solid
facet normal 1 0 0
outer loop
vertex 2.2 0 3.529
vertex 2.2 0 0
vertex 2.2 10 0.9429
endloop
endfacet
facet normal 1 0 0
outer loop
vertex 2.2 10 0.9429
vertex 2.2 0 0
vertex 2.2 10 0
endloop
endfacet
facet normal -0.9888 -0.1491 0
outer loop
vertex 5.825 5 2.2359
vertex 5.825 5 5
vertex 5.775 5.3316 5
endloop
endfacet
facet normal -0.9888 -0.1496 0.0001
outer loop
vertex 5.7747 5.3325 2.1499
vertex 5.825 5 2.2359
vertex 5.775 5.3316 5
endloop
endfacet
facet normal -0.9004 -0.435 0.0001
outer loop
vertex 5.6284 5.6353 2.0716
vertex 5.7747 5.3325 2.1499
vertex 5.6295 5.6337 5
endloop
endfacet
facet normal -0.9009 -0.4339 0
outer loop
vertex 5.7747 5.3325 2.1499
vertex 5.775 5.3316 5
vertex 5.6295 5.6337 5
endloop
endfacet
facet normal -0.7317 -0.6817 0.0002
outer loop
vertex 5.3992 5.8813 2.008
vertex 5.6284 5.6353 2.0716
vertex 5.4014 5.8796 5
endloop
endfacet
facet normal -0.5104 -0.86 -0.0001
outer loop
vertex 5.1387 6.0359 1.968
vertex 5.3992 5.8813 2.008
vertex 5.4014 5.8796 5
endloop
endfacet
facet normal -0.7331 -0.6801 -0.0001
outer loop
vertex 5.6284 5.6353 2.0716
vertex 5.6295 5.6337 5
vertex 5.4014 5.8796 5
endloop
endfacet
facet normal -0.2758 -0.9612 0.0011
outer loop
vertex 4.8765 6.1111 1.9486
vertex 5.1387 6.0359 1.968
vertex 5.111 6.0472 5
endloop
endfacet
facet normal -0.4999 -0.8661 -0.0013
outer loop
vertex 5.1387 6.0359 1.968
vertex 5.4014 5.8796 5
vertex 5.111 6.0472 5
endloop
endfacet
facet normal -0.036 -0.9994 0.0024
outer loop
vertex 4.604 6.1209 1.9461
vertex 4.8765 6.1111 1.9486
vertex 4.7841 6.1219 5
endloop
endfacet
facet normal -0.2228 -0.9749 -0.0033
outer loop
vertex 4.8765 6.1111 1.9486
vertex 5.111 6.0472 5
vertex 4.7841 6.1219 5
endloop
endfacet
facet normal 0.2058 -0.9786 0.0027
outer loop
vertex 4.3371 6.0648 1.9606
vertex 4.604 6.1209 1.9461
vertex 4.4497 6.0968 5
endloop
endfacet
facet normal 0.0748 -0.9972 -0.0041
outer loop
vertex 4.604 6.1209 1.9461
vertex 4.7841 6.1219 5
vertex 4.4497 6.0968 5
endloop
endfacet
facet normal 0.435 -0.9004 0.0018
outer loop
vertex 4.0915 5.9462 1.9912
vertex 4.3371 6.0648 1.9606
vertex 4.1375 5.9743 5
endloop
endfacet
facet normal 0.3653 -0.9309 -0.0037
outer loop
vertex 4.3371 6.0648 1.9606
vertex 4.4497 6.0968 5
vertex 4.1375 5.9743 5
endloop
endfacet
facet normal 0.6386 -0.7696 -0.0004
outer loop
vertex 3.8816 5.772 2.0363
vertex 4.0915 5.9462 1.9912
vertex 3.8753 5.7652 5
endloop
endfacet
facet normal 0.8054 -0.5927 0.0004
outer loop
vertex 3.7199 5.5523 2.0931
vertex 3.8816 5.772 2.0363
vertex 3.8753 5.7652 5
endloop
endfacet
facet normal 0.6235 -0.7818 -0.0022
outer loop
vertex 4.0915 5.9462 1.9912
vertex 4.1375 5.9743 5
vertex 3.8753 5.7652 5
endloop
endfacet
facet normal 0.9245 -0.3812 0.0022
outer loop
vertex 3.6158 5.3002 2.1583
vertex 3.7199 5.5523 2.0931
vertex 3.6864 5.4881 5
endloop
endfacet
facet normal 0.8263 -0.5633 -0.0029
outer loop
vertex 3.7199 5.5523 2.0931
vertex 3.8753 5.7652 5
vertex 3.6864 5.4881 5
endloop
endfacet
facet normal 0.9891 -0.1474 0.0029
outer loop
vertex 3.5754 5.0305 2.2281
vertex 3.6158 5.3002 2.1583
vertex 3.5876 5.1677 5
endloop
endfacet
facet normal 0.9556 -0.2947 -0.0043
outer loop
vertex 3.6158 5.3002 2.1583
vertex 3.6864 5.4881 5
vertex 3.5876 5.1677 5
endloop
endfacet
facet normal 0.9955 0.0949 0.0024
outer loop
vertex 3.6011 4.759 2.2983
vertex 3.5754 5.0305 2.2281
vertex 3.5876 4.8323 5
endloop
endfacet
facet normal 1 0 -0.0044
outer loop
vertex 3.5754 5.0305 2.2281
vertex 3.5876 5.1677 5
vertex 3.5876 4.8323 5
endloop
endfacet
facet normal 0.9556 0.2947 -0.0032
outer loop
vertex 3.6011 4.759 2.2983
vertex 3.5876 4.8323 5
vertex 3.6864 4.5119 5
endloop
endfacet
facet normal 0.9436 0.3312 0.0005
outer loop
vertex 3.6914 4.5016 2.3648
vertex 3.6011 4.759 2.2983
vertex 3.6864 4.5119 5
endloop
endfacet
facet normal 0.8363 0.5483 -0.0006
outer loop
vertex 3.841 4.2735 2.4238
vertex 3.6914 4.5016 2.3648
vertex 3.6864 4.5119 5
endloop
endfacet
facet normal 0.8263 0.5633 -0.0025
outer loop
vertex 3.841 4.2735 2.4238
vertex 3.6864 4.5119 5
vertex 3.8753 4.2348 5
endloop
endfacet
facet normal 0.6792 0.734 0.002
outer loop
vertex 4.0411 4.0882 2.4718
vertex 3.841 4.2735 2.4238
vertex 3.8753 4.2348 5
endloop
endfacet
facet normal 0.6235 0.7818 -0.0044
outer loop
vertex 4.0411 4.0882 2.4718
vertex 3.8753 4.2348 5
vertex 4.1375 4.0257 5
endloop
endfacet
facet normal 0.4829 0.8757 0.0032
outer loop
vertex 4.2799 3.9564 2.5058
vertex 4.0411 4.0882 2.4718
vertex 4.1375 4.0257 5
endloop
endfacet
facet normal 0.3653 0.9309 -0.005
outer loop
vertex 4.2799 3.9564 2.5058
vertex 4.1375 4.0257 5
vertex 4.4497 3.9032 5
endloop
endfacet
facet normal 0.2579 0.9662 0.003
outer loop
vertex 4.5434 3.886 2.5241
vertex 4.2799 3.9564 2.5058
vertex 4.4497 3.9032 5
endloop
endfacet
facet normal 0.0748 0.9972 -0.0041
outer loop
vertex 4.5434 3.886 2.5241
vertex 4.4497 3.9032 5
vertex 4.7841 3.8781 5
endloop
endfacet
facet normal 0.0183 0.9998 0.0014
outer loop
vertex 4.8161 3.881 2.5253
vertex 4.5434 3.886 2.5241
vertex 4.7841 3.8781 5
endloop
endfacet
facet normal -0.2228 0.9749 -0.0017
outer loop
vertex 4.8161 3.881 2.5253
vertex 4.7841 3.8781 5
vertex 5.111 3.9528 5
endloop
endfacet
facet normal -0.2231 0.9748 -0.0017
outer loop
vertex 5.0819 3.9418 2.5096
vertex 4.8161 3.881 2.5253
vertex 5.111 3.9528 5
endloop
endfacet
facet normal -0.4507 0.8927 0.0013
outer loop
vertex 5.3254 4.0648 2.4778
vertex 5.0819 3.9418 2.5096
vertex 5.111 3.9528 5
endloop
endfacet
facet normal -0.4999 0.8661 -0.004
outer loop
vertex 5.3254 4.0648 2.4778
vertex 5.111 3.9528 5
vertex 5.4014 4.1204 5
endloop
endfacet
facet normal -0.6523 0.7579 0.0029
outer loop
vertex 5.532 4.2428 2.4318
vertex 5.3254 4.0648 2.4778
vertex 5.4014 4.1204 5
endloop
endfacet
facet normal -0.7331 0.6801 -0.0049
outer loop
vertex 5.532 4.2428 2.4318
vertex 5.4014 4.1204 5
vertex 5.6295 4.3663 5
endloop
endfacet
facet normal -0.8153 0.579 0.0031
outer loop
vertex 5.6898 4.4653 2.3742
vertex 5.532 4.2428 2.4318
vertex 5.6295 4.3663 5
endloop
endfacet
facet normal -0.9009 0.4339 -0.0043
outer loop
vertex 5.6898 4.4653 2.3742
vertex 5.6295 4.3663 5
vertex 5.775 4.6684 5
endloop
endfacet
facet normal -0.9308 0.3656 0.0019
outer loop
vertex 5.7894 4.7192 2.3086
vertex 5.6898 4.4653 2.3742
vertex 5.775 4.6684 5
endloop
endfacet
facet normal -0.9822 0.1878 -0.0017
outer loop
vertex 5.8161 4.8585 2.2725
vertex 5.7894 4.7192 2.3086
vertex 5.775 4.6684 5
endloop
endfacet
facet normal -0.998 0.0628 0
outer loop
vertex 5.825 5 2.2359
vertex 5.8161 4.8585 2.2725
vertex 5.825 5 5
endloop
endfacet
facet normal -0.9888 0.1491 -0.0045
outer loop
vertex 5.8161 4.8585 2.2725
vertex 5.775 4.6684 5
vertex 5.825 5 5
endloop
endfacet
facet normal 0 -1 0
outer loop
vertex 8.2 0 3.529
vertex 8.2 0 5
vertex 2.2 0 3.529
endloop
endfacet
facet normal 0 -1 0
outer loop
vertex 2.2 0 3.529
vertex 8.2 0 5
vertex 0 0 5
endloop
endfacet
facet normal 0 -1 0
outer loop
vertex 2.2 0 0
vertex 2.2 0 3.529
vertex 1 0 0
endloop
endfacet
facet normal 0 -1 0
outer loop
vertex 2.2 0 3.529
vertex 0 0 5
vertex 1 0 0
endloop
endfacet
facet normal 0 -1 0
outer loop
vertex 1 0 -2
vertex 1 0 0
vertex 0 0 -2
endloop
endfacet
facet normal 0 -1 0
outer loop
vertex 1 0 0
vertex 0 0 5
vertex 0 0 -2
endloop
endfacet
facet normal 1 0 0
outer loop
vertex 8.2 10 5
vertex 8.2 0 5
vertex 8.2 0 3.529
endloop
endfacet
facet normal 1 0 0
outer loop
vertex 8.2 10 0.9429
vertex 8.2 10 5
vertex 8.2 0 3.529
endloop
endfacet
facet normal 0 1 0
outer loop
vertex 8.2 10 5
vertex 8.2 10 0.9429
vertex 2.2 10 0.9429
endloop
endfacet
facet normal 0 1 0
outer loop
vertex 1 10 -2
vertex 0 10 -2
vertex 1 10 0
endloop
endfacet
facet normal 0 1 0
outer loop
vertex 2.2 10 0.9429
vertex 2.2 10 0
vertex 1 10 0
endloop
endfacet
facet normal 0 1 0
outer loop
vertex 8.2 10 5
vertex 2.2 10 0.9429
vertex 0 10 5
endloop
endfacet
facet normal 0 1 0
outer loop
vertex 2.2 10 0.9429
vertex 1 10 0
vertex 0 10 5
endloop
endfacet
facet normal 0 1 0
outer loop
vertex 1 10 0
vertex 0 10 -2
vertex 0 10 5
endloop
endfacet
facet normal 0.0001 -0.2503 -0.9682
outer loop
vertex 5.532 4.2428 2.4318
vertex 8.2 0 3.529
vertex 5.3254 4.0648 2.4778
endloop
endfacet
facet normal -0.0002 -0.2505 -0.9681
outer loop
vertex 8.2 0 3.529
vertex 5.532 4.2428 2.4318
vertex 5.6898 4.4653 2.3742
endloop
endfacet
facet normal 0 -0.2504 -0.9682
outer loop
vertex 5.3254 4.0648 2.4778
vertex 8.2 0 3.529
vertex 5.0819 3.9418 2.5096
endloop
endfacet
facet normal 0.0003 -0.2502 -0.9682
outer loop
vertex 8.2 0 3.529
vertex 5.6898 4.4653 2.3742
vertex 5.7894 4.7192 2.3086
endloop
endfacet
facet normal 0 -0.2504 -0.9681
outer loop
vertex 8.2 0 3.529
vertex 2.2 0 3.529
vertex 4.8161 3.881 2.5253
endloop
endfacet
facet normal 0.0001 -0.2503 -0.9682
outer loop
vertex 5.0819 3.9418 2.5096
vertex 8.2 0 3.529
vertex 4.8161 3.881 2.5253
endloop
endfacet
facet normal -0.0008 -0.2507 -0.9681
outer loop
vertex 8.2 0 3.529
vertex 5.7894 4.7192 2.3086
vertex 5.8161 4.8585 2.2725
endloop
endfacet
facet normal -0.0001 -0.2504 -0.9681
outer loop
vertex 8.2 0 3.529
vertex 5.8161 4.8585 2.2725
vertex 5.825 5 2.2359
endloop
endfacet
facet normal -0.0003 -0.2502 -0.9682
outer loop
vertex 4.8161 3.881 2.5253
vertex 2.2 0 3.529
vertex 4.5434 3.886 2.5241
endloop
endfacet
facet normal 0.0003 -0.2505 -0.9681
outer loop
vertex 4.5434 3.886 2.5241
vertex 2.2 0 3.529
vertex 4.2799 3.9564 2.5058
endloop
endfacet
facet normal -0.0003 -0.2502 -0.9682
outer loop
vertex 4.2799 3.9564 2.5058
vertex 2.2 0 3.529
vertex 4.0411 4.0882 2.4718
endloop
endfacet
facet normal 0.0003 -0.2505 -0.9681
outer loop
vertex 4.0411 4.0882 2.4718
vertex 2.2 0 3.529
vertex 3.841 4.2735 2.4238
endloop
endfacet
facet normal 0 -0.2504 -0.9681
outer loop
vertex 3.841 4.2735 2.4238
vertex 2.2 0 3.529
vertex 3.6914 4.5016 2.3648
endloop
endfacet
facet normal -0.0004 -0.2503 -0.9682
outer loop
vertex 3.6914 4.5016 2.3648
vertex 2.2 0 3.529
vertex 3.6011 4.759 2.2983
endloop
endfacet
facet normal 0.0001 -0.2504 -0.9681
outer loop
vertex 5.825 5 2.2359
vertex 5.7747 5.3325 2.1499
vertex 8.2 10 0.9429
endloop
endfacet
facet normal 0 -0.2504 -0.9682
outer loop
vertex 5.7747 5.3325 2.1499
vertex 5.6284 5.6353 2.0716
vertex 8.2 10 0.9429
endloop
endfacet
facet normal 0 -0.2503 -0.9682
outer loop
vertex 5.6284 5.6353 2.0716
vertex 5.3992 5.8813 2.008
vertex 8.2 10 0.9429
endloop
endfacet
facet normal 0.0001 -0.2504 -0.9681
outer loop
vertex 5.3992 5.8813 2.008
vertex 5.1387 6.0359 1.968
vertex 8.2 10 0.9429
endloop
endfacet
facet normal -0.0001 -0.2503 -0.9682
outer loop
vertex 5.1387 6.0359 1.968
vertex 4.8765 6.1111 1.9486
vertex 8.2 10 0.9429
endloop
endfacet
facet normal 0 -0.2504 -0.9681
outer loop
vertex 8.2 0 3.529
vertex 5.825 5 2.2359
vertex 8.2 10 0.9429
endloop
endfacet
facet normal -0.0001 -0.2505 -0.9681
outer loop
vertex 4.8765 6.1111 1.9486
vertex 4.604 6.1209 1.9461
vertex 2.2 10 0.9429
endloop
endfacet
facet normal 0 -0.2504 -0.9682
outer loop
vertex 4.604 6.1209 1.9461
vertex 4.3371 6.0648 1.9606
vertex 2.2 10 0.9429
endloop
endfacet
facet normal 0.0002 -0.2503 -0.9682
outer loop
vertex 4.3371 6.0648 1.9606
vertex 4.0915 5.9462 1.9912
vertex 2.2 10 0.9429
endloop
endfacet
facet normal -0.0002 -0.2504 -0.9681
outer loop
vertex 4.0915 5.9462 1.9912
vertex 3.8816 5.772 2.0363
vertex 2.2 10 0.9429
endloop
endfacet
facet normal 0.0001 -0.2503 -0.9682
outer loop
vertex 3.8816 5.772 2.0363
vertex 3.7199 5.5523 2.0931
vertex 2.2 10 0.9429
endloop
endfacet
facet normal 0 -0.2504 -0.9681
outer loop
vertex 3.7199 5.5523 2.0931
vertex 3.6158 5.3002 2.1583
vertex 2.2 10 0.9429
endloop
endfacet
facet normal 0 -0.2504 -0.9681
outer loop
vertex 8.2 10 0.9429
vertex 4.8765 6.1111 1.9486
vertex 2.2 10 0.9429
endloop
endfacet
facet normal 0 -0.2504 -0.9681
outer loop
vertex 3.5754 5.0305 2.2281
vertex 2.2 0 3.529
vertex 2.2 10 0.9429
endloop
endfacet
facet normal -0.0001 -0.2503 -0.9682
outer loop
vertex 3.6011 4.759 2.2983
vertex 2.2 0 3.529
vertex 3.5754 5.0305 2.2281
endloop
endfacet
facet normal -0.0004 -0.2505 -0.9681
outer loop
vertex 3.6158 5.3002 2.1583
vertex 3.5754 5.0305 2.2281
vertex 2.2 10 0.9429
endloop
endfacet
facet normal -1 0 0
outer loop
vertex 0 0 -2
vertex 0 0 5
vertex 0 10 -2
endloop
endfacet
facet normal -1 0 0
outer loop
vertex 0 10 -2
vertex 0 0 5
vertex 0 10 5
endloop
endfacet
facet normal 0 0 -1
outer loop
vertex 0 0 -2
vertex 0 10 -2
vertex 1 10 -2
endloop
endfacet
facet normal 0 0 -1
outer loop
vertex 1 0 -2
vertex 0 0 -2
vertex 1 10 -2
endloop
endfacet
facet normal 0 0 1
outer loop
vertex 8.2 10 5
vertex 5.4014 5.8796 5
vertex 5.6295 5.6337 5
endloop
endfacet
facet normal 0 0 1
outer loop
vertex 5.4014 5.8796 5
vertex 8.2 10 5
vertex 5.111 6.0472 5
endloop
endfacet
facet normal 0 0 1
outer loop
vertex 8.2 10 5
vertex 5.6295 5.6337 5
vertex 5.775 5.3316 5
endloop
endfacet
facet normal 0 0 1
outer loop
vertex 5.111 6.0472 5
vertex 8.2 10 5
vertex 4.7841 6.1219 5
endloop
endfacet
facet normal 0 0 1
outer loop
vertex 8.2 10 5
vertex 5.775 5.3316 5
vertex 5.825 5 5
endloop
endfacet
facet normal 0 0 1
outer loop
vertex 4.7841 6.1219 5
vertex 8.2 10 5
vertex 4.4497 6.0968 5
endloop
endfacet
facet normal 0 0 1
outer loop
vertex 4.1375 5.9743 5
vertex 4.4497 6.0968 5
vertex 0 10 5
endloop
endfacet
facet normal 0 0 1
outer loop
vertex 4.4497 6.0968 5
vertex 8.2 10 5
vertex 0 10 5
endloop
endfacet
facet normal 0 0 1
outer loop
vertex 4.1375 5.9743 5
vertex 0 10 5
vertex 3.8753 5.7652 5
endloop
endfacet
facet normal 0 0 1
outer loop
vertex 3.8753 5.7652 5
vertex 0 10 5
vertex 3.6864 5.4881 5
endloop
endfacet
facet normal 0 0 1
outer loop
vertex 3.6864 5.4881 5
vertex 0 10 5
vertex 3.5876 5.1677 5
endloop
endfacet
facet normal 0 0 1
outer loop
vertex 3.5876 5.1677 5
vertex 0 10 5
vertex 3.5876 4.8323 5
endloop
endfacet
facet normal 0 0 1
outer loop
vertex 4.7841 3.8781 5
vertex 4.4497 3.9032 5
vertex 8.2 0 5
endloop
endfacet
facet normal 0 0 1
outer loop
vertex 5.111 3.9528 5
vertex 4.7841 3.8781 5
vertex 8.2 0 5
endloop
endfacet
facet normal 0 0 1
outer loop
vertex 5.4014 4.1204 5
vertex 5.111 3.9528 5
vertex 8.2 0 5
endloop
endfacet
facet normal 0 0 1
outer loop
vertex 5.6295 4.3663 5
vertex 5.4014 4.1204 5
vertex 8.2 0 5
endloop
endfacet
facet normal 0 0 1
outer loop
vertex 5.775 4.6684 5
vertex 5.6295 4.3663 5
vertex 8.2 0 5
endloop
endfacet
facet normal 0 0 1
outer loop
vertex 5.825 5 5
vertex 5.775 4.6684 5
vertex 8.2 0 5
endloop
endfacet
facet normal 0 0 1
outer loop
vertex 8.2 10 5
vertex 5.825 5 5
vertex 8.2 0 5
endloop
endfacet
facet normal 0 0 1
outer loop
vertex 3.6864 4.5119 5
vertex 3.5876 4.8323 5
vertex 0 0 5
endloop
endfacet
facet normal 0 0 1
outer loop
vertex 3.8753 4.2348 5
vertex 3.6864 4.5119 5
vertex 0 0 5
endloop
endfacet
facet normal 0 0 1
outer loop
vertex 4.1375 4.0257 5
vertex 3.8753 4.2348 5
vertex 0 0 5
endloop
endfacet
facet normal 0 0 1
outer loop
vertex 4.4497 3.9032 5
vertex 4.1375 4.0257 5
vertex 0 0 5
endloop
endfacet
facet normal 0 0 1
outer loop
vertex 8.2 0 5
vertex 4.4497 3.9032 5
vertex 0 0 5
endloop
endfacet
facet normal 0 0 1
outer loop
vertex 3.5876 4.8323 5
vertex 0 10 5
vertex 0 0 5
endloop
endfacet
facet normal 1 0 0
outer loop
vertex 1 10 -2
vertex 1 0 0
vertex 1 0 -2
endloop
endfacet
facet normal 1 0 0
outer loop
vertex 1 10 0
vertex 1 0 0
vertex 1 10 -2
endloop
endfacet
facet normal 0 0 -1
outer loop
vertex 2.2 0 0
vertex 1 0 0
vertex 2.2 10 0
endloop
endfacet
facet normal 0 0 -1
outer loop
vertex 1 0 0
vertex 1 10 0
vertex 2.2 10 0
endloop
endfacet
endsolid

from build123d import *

# Parameters (mm, degrees)
SKETCH2_W           = 2.2
SKETCH2_H           = 10
BOSS_EXTRUDE1_DEPTH = 5
SKETCH2_3_W         = 1
SKETCH2_3_H         = 10
BOSS_EXTRUDE2_DEPTH = 2
BOSS_EXTRUDE3_DEPTH = 6
SKETCH4_R           = 1.125
CUT_EXTRUDE1_DEPTH  = 6


with BuildPart() as part:
    # Sketch2 → Boss-Extrude1 (new body)
    with BuildSketch(Plane.XY):
        with Locations((1.1, 5)):
            Rectangle(SKETCH2_W, SKETCH2_H)
    extrude(amount=BOSS_EXTRUDE1_DEPTH)

    # Sketch2<3> → Boss-Extrude2 (add)
    with BuildSketch(Plane.XY):
        with Locations((0.5, 5)):
            Rectangle(SKETCH2_3_W, SKETCH2_3_H)
    extrude(amount=-BOSS_EXTRUDE2_DEPTH)

    # Sketch3 → Boss-Extrude3 (add)
    with BuildSketch(Plane(origin=(2.2, 0, 0), x_dir=(0, 0, -1), z_dir=(1, 0, 0))):
        Polygon((-5, 0), (-3.52903009, 0), (-0.942854246, 10), (-5, 10), align=None)
    extrude(amount=BOSS_EXTRUDE3_DEPTH)

    # Sketch4 → Cut-Extrude1 (cut)
    with BuildSketch(Plane.XY.offset(5)):
        with Locations((4.7, 5)):
            Circle(SKETCH4_R)
    extrude(amount=-CUT_EXTRUDE1_DEPTH, mode=Mode.SUBTRACT)


solid = part.part
